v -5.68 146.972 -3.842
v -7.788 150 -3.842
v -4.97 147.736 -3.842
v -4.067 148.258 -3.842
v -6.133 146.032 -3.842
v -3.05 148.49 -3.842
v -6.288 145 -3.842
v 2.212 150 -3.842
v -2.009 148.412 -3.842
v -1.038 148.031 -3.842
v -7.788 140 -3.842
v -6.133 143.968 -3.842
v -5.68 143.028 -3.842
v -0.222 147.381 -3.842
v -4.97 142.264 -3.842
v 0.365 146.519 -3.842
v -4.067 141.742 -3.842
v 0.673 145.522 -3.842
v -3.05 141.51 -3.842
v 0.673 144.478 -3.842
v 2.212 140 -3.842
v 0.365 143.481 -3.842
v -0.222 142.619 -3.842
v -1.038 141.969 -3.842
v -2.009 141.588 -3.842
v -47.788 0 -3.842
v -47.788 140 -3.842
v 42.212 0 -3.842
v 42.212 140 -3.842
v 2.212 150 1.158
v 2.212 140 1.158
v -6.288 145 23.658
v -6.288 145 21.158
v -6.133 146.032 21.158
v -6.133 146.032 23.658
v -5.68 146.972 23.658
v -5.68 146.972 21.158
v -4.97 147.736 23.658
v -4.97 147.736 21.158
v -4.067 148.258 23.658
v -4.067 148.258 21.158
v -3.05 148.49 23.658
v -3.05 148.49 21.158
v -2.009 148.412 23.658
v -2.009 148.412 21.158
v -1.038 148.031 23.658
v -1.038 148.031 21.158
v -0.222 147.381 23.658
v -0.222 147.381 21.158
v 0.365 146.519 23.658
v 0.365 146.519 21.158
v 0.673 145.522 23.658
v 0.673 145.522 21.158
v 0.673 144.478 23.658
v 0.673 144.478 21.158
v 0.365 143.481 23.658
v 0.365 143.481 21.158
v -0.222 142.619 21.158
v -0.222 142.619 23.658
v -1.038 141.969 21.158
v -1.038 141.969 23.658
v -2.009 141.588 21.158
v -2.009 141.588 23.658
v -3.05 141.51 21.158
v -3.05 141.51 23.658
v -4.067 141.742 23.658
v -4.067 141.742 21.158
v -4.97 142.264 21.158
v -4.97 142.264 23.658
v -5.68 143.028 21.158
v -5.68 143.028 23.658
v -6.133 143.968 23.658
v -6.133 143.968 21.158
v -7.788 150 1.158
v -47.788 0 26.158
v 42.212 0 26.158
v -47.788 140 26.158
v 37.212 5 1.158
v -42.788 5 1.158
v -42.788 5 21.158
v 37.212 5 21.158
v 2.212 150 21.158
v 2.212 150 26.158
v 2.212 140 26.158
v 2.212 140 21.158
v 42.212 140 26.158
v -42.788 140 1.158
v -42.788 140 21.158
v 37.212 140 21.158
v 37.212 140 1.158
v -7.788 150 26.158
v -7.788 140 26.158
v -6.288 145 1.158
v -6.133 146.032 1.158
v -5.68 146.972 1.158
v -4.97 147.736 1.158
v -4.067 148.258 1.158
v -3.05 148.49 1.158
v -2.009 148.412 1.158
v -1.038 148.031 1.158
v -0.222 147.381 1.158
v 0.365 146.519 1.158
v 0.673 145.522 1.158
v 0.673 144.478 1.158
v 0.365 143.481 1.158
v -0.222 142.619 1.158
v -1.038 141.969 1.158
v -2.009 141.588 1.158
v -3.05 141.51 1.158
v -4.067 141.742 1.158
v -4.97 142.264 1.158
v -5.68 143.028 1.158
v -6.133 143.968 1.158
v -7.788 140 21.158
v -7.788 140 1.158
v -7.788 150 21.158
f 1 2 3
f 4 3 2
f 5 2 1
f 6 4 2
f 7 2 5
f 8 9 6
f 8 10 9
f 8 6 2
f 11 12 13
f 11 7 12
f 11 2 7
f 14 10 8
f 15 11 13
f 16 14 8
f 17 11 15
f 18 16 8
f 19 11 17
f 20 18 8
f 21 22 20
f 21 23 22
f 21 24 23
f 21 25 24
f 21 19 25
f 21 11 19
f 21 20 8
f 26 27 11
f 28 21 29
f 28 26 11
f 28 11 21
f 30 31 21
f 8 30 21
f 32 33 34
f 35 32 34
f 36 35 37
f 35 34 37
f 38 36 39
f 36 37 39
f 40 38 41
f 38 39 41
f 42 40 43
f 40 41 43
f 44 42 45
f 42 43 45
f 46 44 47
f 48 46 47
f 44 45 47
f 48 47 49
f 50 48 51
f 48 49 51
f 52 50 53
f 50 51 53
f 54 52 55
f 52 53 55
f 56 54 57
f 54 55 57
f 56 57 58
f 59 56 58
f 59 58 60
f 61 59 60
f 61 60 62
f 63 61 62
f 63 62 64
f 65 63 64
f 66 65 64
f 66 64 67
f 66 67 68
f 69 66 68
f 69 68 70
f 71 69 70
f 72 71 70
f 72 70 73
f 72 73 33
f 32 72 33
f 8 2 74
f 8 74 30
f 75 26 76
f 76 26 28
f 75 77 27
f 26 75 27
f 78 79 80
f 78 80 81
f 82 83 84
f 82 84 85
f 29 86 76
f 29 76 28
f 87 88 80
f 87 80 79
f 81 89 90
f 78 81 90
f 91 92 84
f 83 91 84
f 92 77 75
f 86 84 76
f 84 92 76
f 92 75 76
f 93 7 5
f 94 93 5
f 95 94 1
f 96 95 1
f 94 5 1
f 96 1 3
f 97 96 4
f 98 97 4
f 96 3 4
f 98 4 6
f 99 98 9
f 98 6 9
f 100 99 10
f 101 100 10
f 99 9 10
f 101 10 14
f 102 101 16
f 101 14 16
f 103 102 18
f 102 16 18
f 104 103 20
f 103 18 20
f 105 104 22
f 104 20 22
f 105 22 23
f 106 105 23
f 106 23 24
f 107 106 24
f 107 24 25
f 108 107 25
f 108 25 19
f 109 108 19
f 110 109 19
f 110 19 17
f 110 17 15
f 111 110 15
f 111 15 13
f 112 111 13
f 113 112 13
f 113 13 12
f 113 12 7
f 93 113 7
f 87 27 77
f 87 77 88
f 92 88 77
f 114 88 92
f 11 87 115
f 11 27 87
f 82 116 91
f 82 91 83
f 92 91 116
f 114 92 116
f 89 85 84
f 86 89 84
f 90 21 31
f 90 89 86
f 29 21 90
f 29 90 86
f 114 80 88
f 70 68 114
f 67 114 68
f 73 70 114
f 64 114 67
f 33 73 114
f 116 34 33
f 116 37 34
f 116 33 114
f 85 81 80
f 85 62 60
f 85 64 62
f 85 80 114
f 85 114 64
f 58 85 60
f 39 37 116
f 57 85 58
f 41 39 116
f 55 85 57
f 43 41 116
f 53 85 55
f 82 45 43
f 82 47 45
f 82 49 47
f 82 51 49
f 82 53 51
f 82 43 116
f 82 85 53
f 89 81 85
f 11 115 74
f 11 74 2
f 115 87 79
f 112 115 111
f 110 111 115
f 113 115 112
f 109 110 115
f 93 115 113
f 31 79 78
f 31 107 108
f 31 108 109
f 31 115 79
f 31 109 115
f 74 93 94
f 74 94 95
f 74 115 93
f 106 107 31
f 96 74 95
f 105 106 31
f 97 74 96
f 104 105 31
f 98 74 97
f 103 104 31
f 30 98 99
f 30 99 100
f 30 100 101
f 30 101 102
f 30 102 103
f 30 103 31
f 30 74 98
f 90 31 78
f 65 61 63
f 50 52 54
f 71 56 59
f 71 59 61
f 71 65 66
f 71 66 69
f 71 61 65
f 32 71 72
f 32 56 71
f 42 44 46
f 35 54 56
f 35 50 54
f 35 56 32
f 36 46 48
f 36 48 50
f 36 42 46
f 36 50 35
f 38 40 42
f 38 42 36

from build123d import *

# Parameters (mm, degrees)
SKETCH1_W           = 90
SKETCH1_H           = 30
BOSS_EXTRUDE1_DEPTH = 140
SKETCH2_W           = 80
SKETCH2_H           = 20
CUT_EXTRUDE1_DEPTH  = 135
SKETCH4_W           = 10
SKETCH4_H           = 30
BOSS_EXTRUDE2_DEPTH = 10
SKETCH7_W           = 20
SKETCH7_H           = 10
CUT_EXTRUDE3_DEPTH  = 10
SKETCH5_R           = 3.5
CUT_EXTRUDE4_DEPTH  = 27.5


with BuildPart() as part:
    # Sketch1 → Boss-Extrude1 (new body)
    with BuildSketch(Plane(origin=(0, 0, 0), x_dir=(1, 0, 0), z_dir=(0, 1, 0))):
        with Locations((-2.788023643, -11.157655047)):
            Rectangle(SKETCH1_W, SKETCH1_H)
    extrude(amount=BOSS_EXTRUDE1_DEPTH)

    # Sketch2 → Cut-Extrude1 (cut)
    with BuildSketch(Plane(origin=(0, 140, 0), x_dir=(1, 0, 0), z_dir=(0, 1, 0))):
        with Locations((-2.788023643, -11.157655047)):
            Rectangle(SKETCH2_W, SKETCH2_H)
    extrude(amount=-CUT_EXTRUDE1_DEPTH, mode=Mode.SUBTRACT)

    # Sketch4 → Boss-Extrude2 (add)
    with BuildSketch(Plane(origin=(0, 140, 0), x_dir=(1, 0, 0), z_dir=(0, 1, 0))):
        with Locations((-2.788023643, -11.157655047)):
            Rectangle(SKETCH4_W, SKETCH4_H)
    extrude(amount=BOSS_EXTRUDE2_DEPTH)

    # Sketch7 → Cut-Extrude3 (cut)
    with BuildSketch(Plane(origin=(2.211976357, 0, 0), x_dir=(0, 0, -1), z_dir=(1, 0, 0))):
        with Locations((-11.157655047, 145)):
            Rectangle(SKETCH7_W, SKETCH7_H)
    extrude(amount=-CUT_EXTRUDE3_DEPTH, mode=Mode.SUBTRACT)

    # Sketch5 → Cut-Extrude4 (cut)
    with BuildSketch(Plane(origin=(0, 0, -3.842344953), x_dir=(-1, 0, 0), z_dir=(0, 0, -1))):
        with Locations((2.788023643, 145)):
            Circle(SKETCH5_R)
    extrude(amount=-CUT_EXTRUDE4_DEPTH, mode=Mode.SUBTRACT)


solid = part.part
